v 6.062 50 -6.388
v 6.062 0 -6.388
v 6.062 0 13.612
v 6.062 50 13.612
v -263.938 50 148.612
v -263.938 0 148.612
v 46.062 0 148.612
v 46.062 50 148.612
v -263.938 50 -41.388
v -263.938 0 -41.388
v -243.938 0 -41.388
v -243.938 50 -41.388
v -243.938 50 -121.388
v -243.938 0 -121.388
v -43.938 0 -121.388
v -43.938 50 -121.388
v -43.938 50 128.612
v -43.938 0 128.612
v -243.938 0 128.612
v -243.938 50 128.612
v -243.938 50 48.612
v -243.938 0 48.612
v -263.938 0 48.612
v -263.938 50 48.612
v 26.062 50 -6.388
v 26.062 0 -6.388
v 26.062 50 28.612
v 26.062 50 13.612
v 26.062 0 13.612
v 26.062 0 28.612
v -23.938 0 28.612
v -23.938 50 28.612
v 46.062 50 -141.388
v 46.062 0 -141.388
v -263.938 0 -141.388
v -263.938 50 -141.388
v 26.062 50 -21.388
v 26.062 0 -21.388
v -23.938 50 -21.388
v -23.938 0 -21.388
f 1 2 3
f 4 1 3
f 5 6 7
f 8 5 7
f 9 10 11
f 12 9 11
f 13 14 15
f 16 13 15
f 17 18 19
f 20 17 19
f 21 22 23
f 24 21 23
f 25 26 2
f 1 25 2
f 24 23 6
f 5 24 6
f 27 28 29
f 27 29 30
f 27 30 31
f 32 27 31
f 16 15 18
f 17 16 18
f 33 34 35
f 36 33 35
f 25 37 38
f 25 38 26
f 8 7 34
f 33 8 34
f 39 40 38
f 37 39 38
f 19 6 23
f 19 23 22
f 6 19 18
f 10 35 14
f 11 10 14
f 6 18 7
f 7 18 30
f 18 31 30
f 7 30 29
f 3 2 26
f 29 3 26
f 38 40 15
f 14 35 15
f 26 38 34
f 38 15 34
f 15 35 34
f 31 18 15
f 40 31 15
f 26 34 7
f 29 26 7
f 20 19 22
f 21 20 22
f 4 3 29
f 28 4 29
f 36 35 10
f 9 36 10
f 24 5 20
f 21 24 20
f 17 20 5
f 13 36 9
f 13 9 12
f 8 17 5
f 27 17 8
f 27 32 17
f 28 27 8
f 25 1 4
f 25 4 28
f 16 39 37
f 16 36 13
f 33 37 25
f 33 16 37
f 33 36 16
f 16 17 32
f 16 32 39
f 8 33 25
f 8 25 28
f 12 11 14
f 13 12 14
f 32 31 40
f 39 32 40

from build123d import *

# Parameters (mm, degrees)
BOSS_EXTRUDE2_DEPTH = 50


with BuildPart() as part:
    # Sketch1 → Boss-Extrude2 (new body)
    with BuildSketch(Plane(origin=(0, 0, 0), x_dir=(1, 0, 0), z_dir=(0, 1, 0))):
        Polygon((46.062322946, 141.388101983), (-263.937677054, 141.388101983), (-263.937677054, 41.388101983), (-243.937677054, 41.388101983), (-243.937677054, 121.388101983), (-43.937677054, 121.388101983), (-43.937677054, -128.611898017), (-243.937677054, -128.611898017), (-243.937677054, -48.611898017), (-263.937677054, -48.611898017), (-263.937677054, -148.611898017), (46.062322946, -148.611898017), align=None)
        Polygon((26.062322946, -28.611898017), (-23.937677054, -28.611898017), (-23.937677054, 21.388101983), (26.062322946, 21.388101983), (26.062322946, 6.388101983), (6.062322946, 6.388101983), (6.062322946, -13.611898017), (26.062322946, -13.611898017), align=None, mode=Mode.SUBTRACT)
    extrude(amount=BOSS_EXTRUDE2_DEPTH)


solid = part.part
